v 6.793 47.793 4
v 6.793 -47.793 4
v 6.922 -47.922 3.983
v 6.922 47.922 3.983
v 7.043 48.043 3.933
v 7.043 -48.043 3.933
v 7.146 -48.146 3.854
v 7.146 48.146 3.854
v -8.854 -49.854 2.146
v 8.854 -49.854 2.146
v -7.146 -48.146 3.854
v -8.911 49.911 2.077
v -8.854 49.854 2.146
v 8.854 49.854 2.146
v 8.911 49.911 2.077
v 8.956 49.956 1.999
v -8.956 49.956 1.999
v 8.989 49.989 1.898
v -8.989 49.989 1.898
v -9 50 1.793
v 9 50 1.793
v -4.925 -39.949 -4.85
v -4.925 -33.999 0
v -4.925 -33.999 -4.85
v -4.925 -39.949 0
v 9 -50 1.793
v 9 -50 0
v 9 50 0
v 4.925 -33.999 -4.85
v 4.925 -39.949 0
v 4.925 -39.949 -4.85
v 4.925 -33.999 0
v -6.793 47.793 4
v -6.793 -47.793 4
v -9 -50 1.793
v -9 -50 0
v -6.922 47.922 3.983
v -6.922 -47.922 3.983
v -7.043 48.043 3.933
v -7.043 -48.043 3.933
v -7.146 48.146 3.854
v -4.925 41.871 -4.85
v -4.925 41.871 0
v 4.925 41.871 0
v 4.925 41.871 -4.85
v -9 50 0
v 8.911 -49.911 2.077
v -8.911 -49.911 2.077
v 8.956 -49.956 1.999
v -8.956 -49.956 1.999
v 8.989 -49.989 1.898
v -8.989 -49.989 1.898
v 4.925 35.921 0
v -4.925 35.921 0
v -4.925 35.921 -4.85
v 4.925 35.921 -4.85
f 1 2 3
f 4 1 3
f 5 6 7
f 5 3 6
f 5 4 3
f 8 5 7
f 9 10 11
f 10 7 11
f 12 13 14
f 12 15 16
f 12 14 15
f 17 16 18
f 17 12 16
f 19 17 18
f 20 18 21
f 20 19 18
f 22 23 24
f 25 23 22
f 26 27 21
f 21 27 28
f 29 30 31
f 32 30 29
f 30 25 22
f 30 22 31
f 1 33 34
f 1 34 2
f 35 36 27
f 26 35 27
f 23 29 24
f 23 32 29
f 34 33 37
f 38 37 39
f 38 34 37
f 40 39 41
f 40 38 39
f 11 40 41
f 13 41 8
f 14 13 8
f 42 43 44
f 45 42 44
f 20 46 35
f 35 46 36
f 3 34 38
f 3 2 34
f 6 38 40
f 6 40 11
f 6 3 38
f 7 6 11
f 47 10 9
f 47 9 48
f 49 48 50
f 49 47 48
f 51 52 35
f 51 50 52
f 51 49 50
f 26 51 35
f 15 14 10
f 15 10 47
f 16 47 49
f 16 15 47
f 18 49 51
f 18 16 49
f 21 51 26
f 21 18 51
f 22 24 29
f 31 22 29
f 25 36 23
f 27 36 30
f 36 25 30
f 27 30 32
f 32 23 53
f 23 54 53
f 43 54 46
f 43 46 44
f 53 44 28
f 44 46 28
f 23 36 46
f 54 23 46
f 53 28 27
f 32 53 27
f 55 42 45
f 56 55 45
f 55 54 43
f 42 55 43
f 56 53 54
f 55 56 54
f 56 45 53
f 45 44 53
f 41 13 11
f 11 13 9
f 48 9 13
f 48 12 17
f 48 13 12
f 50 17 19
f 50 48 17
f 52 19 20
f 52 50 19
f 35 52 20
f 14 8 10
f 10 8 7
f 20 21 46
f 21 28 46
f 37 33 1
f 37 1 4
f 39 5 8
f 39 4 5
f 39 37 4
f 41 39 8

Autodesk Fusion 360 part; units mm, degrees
sketch "Sketch1" plane through (0, 0, 0) normal (0, 0, 1) x (1, 0, 0)
  line L0 (9, 50) -> (-9, 50)
  line L1 (-9, 50) -> (-9, -50)
  line L2 (-9, -50) -> (9, -50)
  line L3 (9, -50) -> (9, 50)
  line L4 (9, 50) -> (-9, -50) construction
  line L5 (-9, 50) -> (9, -50) construction
  line L6 (-4.925, 41.8706) -> (4.925, 41.8706)
  line L7 (4.925, 41.8706) -> (4.925, 35.9206)
  line L8 (4.925, 35.9206) -> (-4.925, 35.9206)
  line L9 (-4.925, 35.9206) -> (-4.925, 41.8706)
  line L10 (-4.925, 41.8706) -> (4.925, 35.9206) construction
  line L11 (4.925, 41.8706) -> (-4.925, 35.9206) construction
  line L12 (4.925, -33.9994) -> (-4.925, -33.9994)
  line L13 (-4.925, -33.9994) -> (-4.925, -39.9494)
  line L14 (-4.925, -39.9494) -> (4.925, -39.9494)
  line L15 (4.925, -39.9494) -> (4.925, -33.9994)
  line L16 (4.925, -33.9994) -> (-4.925, -39.9494) construction
  line L17 (-4.925, -33.9994) -> (4.925, -39.9494) construction
  point P0 (0, 38.8956)
  point P1 (0, -36.9744)
  dimension "d1" = 18
  dimension "d2" = 100
  dimension "d3" = 5.95
  dimension "d4" = 9.85
  dimension "d5" = 5.95
  dimension "d9" = 4.925
  dimension "d10" = 33.9994
  dimension "d11" = 69.92
extrude "Extrude1" add sketch "Sketch1" against normal blind 4.85 contours L6 L7 L8 L9 | L12 L13 L14 L15 makes body 1 at (-1.6417, 37.9039, 0) makes body 2 at (1.6417, -35.9827, 0)
sketch "Sketch2" plane through (0, 0, 0) normal (0, 0, 1) x (1, 0, 0)
  line L0 (9, 50) -> (-9, 50)
  line L1 (-9, 50) -> (-9, -50)
  line L2 (-9, -50) -> (9, -50)
  line L3 (9, -50) -> (9, 50)
  line L4 (9, 50) -> (-9, -50) construction
  line L5 (-9, 50) -> (9, -50) construction
  dimension "d14" = 18
  dimension "d15" = 100
extrude "Extrude2" add sketch "Sketch2" along normal blind 4 bodies 1 2
chamfer "Chamfer1" distance 2 angle 45 1 faces at (-3, -16.6667, 4) on bodies 1
fillet "Fillet1" radius 0.5 8 edges at (-7, 0, 4) (0, -48, 4) (7, 0, 4) (0, 48, 4) (-9, 0, 2) (0, -50, 2) (0, 50, 2) (9, 0, 2) on bodies 1
